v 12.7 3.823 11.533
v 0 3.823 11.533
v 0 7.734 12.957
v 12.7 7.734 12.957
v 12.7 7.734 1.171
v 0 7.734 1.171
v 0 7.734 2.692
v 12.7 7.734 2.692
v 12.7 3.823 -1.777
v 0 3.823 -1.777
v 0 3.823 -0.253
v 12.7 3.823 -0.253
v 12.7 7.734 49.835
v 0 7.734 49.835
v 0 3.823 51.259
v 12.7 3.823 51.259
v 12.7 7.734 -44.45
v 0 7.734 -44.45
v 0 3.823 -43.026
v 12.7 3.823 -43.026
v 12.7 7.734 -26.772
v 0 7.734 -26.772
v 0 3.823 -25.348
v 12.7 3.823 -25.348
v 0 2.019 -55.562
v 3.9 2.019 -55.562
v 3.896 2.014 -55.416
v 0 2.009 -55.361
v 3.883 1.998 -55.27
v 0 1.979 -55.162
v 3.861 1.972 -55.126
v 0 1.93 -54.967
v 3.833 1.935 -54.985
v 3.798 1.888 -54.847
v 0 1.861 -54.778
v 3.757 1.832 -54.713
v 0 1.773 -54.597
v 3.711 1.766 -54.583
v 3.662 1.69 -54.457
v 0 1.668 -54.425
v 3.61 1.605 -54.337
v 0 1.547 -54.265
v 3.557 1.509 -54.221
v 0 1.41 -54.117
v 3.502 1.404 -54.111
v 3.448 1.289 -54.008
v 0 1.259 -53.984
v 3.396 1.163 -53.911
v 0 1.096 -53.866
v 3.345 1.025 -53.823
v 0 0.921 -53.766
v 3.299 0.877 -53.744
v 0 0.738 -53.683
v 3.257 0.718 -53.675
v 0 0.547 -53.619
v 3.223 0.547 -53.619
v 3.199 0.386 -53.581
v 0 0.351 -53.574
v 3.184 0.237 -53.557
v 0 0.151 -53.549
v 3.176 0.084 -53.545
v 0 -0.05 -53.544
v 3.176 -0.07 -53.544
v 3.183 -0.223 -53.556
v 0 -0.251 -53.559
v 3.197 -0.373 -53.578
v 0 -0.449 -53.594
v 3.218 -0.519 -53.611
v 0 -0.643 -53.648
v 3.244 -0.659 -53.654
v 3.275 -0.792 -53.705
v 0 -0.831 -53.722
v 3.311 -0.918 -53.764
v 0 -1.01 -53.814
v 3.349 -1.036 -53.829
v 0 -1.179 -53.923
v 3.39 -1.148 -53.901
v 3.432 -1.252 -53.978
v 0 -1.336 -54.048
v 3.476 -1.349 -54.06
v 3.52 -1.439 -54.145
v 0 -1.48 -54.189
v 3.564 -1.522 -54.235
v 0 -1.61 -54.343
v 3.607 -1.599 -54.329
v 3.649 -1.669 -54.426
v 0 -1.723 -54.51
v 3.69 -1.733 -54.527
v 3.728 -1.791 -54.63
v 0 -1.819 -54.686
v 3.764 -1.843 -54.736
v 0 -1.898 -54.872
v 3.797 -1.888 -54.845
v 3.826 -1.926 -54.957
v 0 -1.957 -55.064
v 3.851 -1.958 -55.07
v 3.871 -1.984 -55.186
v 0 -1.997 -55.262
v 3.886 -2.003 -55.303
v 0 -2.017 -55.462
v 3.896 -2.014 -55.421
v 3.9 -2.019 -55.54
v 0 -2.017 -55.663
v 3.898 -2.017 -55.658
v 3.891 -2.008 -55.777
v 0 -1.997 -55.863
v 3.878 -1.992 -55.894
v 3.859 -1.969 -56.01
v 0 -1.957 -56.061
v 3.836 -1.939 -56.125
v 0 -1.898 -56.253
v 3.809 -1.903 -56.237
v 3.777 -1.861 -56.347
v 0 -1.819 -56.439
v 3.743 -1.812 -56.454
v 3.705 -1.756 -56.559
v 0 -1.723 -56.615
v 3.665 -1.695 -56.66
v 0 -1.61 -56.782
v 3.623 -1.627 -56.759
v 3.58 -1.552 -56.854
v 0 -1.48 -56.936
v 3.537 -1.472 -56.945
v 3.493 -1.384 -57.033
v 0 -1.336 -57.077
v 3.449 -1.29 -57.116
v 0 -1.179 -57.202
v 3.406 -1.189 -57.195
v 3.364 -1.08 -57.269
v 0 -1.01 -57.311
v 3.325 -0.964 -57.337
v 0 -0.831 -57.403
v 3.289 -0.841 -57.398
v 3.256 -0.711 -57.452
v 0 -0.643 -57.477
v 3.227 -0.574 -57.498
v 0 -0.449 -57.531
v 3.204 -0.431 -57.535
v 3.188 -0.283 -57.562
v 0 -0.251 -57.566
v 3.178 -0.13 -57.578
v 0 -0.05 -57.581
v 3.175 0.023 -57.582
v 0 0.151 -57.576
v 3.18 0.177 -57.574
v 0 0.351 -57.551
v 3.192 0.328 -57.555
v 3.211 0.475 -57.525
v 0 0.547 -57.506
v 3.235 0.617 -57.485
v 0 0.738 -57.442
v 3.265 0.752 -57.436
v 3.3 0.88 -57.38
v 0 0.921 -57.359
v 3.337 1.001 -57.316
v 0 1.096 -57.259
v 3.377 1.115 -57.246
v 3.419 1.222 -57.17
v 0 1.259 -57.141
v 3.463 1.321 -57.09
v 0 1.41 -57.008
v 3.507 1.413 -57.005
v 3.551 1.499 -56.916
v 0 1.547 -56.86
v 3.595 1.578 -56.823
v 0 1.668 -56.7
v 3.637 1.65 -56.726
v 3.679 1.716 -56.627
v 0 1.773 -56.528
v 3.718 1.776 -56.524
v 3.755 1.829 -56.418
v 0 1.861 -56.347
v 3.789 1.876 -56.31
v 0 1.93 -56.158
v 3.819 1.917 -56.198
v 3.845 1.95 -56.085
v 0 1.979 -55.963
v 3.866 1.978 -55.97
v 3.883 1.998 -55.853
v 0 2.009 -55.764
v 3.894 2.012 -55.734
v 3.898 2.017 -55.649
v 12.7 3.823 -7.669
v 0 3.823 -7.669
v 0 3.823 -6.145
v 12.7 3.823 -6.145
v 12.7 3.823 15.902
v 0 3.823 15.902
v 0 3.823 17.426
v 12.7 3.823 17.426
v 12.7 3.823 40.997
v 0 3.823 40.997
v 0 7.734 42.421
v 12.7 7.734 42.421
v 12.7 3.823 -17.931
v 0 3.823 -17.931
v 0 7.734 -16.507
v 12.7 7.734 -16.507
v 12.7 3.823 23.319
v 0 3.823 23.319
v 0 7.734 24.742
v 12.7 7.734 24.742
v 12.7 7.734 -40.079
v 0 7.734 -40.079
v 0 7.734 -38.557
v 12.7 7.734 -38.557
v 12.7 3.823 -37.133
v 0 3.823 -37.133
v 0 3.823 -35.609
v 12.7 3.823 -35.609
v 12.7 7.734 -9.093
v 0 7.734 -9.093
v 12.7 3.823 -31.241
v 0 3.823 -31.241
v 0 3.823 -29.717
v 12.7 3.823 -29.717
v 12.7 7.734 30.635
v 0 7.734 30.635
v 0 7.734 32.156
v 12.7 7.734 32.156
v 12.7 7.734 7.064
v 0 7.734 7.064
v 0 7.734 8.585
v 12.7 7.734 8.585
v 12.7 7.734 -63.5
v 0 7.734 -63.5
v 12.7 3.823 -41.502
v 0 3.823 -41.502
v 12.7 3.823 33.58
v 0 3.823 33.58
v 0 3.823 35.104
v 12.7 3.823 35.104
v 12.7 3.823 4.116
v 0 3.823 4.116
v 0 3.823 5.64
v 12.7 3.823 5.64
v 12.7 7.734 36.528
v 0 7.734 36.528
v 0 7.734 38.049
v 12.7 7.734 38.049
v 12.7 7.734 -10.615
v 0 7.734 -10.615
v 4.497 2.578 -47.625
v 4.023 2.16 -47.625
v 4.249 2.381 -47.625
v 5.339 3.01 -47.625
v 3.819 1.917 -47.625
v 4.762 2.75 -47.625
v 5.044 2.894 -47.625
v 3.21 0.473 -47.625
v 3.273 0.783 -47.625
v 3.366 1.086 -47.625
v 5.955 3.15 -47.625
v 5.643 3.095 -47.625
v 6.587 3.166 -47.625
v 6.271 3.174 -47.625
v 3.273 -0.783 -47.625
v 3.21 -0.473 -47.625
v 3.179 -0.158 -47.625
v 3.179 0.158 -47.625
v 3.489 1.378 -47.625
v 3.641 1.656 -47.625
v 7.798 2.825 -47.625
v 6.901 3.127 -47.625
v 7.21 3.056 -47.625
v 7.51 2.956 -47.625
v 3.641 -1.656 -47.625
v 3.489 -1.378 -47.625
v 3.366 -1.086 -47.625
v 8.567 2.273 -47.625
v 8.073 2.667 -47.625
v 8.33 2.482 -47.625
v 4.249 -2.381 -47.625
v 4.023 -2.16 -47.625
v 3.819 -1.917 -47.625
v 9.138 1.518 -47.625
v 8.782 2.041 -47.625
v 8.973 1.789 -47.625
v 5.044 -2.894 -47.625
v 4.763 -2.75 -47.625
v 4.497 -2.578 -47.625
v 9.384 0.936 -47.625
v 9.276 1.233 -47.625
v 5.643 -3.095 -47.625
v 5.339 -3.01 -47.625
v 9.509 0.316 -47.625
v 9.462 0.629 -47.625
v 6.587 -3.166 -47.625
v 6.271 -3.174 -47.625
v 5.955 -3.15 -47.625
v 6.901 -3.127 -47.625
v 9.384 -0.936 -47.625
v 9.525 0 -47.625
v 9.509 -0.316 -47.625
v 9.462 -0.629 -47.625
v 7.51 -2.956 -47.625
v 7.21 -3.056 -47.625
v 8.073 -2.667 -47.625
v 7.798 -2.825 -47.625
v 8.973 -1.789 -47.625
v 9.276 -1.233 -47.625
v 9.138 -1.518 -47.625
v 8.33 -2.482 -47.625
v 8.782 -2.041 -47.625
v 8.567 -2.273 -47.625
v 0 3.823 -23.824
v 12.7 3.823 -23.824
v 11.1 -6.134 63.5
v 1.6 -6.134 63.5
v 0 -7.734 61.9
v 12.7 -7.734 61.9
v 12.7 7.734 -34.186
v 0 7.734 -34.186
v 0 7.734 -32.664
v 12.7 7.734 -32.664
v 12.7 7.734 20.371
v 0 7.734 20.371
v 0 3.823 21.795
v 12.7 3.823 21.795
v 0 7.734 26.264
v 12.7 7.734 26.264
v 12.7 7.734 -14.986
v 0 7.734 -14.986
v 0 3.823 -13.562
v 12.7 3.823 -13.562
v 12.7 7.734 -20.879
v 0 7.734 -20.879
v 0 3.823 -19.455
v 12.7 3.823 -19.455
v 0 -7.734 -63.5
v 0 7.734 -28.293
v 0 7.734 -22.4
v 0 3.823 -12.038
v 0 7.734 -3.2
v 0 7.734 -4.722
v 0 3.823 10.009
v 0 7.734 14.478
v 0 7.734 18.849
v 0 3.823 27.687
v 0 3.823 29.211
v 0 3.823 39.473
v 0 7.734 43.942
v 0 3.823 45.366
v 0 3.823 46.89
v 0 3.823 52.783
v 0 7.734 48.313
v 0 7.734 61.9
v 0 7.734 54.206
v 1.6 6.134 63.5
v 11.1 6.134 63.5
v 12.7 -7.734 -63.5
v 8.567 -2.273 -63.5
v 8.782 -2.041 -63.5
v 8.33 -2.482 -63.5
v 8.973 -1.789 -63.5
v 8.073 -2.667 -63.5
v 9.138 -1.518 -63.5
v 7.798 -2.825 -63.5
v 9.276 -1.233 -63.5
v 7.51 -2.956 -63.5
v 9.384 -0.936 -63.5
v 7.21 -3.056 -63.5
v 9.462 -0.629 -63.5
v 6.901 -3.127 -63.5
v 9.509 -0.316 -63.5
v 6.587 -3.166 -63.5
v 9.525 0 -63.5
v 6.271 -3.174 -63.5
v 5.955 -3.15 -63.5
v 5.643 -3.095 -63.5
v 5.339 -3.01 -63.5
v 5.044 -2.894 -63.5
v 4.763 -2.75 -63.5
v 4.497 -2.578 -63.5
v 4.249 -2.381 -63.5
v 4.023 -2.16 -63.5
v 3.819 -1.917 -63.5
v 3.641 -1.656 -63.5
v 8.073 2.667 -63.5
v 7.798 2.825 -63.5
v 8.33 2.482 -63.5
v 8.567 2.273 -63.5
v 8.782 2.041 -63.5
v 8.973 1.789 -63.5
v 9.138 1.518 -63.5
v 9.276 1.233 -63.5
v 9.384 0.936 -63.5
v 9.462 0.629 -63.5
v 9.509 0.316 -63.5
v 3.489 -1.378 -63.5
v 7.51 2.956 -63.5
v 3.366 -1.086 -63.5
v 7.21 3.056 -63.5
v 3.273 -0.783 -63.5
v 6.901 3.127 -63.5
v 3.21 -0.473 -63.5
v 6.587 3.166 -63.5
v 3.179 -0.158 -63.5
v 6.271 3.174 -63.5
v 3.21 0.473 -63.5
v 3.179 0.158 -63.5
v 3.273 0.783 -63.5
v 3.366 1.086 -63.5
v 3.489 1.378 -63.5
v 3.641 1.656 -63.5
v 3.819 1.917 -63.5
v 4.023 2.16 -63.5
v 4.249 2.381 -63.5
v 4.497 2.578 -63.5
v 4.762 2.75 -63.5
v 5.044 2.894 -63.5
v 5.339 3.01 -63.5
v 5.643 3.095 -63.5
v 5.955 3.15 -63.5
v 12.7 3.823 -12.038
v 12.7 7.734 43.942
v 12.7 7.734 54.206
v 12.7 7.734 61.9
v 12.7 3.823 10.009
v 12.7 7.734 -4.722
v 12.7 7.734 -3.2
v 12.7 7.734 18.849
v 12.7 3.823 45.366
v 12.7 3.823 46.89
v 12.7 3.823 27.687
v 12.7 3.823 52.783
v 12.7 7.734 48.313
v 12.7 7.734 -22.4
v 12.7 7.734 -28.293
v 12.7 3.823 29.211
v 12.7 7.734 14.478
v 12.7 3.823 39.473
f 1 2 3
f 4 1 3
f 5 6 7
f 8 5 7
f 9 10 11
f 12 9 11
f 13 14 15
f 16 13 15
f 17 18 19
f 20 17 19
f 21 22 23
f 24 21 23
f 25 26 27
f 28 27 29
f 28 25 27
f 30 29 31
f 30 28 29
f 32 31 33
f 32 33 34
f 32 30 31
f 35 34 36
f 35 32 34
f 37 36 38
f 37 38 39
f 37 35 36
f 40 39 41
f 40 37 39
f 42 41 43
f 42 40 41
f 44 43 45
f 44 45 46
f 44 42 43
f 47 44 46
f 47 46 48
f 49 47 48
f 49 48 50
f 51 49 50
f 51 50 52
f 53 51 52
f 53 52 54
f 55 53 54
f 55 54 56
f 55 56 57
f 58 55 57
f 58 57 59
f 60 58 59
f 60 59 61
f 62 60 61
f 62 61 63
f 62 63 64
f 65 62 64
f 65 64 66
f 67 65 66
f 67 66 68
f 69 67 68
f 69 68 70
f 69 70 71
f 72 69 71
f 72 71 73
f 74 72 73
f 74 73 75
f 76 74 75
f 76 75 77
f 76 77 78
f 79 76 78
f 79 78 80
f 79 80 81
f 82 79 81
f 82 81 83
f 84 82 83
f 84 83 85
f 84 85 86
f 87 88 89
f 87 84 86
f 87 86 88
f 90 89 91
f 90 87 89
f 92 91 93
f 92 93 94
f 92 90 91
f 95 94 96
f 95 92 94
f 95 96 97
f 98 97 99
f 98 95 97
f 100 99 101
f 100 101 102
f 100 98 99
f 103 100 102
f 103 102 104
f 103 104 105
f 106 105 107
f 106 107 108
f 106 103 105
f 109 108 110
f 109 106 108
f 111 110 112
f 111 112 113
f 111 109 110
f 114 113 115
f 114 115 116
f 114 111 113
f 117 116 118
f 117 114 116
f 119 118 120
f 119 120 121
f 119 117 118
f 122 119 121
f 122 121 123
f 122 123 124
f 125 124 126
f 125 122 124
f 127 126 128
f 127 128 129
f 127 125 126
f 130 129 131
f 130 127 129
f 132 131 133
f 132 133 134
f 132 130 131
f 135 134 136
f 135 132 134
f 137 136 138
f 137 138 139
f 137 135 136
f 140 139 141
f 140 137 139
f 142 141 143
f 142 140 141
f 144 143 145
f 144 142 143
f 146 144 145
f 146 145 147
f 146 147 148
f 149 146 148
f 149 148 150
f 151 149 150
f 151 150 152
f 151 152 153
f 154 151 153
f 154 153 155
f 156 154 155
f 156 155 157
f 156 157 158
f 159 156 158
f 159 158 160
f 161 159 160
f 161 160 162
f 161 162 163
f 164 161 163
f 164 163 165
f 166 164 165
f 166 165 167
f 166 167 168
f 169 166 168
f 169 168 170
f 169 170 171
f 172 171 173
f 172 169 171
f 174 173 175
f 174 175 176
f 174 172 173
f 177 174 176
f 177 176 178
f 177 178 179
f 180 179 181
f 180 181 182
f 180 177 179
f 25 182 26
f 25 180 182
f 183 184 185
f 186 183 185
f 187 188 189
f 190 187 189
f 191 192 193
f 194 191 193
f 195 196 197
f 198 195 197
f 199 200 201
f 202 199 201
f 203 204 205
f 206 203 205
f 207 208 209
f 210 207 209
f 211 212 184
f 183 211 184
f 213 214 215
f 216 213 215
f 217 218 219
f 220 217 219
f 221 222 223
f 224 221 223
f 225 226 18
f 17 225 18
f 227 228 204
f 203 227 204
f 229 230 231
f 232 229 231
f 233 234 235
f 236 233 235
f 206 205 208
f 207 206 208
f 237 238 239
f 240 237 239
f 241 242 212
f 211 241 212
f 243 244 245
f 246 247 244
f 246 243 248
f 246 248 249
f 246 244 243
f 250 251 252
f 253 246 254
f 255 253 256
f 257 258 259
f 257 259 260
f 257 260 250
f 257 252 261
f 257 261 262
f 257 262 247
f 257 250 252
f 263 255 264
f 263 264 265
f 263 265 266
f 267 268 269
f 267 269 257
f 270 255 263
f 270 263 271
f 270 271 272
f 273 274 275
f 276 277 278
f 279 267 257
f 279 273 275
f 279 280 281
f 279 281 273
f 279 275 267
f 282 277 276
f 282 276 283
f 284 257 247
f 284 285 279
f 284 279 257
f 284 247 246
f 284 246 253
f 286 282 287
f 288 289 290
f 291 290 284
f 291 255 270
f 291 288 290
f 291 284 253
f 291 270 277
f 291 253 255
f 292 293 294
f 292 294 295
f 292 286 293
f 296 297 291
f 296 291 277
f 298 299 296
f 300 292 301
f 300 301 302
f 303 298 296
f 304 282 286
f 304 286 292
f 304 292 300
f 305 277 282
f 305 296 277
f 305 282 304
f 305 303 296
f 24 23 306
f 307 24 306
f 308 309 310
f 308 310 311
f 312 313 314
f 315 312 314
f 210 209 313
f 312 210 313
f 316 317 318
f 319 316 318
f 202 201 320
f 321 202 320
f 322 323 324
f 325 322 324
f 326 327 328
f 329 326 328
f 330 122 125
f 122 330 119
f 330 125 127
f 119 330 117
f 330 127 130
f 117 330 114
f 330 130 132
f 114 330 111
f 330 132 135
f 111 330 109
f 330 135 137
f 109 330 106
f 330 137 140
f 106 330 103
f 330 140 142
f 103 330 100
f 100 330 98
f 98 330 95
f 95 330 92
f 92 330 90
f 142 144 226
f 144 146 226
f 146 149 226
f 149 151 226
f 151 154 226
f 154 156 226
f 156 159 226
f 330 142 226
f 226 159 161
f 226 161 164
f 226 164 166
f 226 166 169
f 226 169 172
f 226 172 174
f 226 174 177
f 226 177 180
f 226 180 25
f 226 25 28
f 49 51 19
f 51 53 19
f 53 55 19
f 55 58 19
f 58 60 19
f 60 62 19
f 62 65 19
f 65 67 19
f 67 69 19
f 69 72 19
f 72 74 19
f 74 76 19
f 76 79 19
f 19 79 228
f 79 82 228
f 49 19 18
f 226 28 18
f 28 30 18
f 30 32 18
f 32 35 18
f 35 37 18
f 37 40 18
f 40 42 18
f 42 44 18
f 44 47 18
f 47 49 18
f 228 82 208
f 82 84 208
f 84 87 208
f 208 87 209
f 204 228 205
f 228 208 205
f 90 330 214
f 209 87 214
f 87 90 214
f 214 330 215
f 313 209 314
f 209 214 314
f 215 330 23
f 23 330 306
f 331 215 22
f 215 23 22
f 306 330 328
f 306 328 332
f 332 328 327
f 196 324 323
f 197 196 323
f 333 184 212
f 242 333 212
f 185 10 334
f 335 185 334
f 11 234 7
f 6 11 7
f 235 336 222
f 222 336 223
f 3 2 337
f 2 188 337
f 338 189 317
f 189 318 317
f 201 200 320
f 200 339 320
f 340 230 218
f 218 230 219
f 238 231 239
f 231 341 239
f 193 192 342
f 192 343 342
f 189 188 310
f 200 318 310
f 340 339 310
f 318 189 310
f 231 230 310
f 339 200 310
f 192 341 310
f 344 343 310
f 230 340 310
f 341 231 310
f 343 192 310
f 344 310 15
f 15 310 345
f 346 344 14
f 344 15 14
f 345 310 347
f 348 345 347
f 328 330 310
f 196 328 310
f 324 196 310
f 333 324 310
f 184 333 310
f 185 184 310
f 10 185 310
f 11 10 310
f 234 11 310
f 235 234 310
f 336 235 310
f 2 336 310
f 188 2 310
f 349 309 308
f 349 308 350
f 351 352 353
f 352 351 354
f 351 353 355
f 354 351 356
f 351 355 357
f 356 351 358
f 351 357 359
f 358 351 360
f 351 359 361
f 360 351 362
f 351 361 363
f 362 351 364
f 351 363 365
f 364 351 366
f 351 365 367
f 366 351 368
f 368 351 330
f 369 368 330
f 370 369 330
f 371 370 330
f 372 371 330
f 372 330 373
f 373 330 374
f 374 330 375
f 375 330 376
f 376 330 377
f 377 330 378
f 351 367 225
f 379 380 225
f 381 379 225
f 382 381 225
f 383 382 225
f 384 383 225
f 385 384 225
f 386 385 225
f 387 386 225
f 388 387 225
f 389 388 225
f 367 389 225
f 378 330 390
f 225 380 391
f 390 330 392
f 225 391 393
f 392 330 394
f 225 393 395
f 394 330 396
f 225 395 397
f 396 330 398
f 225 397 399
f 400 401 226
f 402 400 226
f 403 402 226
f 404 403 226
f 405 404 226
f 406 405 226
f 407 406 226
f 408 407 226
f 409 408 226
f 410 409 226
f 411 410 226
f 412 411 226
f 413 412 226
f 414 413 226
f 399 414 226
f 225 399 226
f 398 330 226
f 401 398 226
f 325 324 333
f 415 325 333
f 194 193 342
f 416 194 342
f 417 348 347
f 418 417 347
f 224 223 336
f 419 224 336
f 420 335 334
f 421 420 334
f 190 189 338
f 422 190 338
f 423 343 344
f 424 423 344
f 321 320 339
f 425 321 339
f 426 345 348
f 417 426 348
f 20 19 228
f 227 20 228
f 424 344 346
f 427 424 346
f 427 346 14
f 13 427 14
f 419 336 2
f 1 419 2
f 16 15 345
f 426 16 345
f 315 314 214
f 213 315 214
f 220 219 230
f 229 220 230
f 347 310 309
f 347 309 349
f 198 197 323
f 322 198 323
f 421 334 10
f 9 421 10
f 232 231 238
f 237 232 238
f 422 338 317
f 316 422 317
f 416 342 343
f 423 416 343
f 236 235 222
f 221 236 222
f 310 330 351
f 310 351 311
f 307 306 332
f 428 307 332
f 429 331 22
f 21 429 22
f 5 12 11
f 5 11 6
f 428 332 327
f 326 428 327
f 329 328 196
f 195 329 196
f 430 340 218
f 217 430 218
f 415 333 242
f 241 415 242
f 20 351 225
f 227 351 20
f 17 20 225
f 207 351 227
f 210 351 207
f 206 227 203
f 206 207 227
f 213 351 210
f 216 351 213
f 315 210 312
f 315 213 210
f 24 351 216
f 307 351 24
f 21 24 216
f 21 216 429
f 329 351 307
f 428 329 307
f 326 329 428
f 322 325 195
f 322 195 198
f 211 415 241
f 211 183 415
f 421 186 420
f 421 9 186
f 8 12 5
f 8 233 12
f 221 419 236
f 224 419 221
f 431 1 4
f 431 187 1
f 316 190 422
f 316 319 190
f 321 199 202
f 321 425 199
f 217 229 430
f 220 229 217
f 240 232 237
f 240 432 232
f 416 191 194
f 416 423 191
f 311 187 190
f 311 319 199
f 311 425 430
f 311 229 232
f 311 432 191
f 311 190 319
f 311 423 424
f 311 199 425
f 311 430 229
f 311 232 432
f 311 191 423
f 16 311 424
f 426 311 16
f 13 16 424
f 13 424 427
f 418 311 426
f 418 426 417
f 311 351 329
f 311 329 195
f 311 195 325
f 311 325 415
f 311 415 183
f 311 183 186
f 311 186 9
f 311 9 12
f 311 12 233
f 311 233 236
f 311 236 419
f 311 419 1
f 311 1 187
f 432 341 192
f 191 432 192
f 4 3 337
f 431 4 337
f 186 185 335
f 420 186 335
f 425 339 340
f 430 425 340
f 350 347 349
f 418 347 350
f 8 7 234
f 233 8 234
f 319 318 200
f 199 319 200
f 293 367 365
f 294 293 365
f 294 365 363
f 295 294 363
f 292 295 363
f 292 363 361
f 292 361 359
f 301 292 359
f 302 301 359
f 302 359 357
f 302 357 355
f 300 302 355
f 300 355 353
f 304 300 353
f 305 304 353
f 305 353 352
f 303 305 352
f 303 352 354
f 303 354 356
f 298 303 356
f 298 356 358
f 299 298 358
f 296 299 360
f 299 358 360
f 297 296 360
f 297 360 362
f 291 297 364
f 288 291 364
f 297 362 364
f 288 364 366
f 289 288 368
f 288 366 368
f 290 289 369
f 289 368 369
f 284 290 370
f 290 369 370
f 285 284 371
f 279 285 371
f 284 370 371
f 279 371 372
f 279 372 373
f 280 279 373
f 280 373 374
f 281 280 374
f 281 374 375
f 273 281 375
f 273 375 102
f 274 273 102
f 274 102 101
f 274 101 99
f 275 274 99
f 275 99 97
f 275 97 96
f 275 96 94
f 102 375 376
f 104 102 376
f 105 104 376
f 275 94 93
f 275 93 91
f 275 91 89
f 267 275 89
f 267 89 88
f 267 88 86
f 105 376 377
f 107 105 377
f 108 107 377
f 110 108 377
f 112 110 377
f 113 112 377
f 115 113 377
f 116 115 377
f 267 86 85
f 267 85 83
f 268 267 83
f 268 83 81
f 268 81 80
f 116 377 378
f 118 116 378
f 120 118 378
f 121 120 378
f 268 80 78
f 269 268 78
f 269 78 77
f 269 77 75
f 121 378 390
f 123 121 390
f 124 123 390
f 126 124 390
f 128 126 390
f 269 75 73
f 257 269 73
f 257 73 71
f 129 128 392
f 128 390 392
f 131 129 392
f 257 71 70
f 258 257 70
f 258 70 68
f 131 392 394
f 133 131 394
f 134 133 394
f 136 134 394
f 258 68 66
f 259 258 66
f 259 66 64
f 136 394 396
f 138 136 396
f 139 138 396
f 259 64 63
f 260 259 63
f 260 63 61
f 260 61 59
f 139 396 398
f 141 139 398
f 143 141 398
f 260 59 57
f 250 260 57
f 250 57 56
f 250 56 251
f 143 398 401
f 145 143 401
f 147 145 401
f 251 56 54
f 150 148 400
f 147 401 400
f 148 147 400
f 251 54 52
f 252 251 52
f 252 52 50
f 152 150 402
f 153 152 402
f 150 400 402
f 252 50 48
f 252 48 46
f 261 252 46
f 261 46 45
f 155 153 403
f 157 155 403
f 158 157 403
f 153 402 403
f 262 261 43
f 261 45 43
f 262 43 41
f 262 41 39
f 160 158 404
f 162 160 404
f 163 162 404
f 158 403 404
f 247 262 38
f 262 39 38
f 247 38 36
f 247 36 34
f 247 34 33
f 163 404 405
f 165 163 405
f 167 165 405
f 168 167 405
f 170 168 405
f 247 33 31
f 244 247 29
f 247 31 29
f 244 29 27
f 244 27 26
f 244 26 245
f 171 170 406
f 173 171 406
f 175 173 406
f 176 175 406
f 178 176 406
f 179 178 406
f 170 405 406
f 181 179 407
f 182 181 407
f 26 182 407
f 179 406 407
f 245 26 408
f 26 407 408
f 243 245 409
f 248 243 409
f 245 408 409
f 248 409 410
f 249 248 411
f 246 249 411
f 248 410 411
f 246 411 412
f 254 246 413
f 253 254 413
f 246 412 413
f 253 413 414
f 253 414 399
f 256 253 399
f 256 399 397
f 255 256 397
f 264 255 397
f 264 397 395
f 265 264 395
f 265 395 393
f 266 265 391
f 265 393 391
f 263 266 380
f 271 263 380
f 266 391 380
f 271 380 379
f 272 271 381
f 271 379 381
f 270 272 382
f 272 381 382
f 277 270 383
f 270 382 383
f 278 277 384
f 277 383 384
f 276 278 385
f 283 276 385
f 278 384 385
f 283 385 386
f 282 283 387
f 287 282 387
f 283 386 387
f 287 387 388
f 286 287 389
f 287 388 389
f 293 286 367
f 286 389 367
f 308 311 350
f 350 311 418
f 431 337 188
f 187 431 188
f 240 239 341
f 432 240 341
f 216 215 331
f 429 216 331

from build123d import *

# Parameters (mm, degrees)
F0_W     = 15.4686
F0_H     = 127
F1_DEPTH = 12.7
F2_R     = 2.0193
F3_DEPTH = 6.35
F4_R     = 3.175
F5_DEPTH = 15.875
F6_SIZE  = 1.6002
F8_DEPTH = 25.4


with BuildPart() as f1:
    # F0 (on Right) → F1 (new body)
    with BuildSketch(Plane.YZ):
        Rectangle(F0_W, F0_H)
    extrude(amount=F1_DEPTH)

    # F2 (on Right) → F3 (cut)
    with BuildSketch(Plane.YZ):
        with Locations((0, -55.5625)):
            Circle(F2_R)
    extrude(amount=F3_DEPTH, mode=Mode.SUBTRACT)

    # F4 (on face) → F5 (cut)
    with BuildSketch(Plane(origin=(0, 0, -63.5), x_dir=(1, 0, 0), z_dir=(0, 0, -1))):
        with Locations((6.35, 0)):
            Circle(F4_R)
    extrude(amount=-F5_DEPTH, mode=Mode.SUBTRACT)

    # F6
    f6_edges = [f1.edges().sort_by_distance(p)[0] for p in [
        (6.35, 7.7343, 63.5),
        (6.35, -7.7343, 63.5),
        (0, 0, 63.5),
        (12.7, 0, 63.5),
    ]]
    chamfer(f6_edges, length=F6_SIZE)

    # F7 (on face) → F8 (cut)
    with BuildSketch(Plane(origin=(0, 0, 0), x_dir=(0, -1, 0), z_dir=(-1, 0, 0))):
        Polygon((-3.8227, -43.026294), (-3.8227, -41.502294), (-7.7343, -40.078588), (-7.7343, -44.45), align=None)
        Polygon((-7.7343, 54.206212), (-7.7343, 49.8348), (-3.8227, 51.258506), (-3.8227, 52.782506), align=None)
        Polygon((-7.7343, 48.313412), (-7.7343, 43.942), (-3.8227, 45.365706), (-3.8227, 46.889706), align=None)
        Polygon((-7.7343, 42.420612), (-7.7343, 38.0492), (-3.8227, 39.472906), (-3.8227, 40.996906), align=None)
        Polygon((-7.7343, 36.527812), (-7.7343, 32.1564), (-3.8227, 33.580106), (-3.8227, 35.104106), align=None)
        Polygon((-7.7343, 30.635012), (-7.7343, 26.2636), (-3.8227, 27.687306), (-3.8227, 29.211306), align=None)
        Polygon((-7.7343, 24.742212), (-7.7343, 20.3708), (-3.8227, 21.794506), (-3.8227, 23.318506), align=None)
        Polygon((-7.7343, 18.849412), (-7.7343, 14.478), (-3.8227, 15.901706), (-3.8227, 17.425706), align=None)
        Polygon((-7.7343, 12.956612), (-7.7343, 8.5852), (-3.8227, 10.008906), (-3.8227, 11.532906), align=None)
        Polygon((-7.7343, 7.063812), (-7.7343, 2.6924), (-3.8227, 4.116106), (-3.8227, 5.640106), align=None)
        Polygon((-7.7343, 1.171012), (-7.7343, -3.2004), (-3.8227, -1.776694), (-3.8227, -0.252694), align=None)
        Polygon((-7.7343, -4.721788), (-7.7343, -9.0932), (-3.8227, -7.669494), (-3.8227, -6.145494), align=None)
        Polygon((-7.7343, -10.614588), (-7.7343, -14.986), (-3.8227, -13.562294), (-3.8227, -12.038294), align=None)
        Polygon((-7.7343, -16.507388), (-7.7343, -20.8788), (-3.8227, -19.455094), (-3.8227, -17.931094), align=None)
        Polygon((-7.7343, -22.400188), (-7.7343, -26.7716), (-3.8227, -25.347894), (-3.8227, -23.823894), align=None)
        Polygon((-7.7343, -28.292988), (-7.7343, -32.6644), (-3.8227, -31.240694), (-3.8227, -29.716694), align=None)
        Polygon((-7.7343, -34.185788), (-7.7343, -38.5572), (-3.8227, -37.133494), (-3.8227, -35.609494), align=None)
    extrude(amount=-F8_DEPTH, mode=Mode.SUBTRACT)


solid = f1.part
